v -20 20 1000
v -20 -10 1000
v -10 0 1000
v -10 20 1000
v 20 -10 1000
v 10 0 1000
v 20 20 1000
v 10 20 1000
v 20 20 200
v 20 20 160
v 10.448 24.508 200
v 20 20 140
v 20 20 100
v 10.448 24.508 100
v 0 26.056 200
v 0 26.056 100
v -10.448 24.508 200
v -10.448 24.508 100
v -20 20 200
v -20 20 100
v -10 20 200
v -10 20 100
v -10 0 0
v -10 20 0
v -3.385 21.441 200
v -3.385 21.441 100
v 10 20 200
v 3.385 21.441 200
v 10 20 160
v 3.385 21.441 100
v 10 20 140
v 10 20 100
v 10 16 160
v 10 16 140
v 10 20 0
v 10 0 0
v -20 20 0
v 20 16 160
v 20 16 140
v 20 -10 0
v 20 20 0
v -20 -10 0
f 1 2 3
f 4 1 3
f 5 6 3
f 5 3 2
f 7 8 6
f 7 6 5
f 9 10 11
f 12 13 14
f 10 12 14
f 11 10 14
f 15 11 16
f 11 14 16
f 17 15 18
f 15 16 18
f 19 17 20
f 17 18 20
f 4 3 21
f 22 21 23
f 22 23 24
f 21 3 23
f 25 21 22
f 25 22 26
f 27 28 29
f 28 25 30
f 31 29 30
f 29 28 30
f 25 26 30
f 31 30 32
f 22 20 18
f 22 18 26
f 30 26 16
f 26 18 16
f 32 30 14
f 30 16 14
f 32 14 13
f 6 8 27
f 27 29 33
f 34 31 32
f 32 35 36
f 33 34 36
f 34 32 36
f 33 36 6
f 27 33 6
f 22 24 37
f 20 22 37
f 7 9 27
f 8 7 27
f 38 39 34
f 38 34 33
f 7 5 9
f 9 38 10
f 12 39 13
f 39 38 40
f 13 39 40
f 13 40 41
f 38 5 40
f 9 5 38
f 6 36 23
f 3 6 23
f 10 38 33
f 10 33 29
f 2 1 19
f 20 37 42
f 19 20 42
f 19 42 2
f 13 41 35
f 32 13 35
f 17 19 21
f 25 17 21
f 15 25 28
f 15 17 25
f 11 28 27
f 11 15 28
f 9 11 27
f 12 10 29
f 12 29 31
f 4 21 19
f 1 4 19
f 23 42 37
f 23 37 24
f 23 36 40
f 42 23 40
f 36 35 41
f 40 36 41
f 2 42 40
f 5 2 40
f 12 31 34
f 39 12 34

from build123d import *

# Parameters (mm, degrees)
EXTRUDE_1_DEPTH          = 1000
EXTRUDE_2_DEPTH          = 100
CUT_EXTRUDE_3_DEPTH      = 20
CUT_EXTRUDE_3_DEPTH_BACK = 842.888353643


with BuildPart() as part:
    # Эскиз2 → Бобышка-Вытянуть1 (new body)
    with BuildSketch(Plane.XY):
        Polygon((0, 0), (-10, 0), (-10, 20), (-20, 20), (-20, -10), (0, -10), (20, -10), (20, 20), (10, 20), (10, 0), align=None)
    extrude(amount=EXTRUDE_1_DEPTH)

    # Эскиз5 → Бобышка-Вытянуть2 (add)
    with BuildSketch(Plane.XY.offset(100)):
        with BuildLine():
            Line((-20, 20), (-10, 20))
            ThreePointArc((-10, 20), (0, 21.622776602), (10, 20))
            Line((10, 20), (20, 20))
            ThreePointArc((20, 20), (0, 26.055512755), (-20, 20))
        make_face()
    extrude(amount=EXTRUDE_2_DEPTH)

    # Sketch 5 2 → Вырез-Вытянуть3 (cut, two sides: drawn at the far end of the back side and taken through both)
    with BuildSketch(Plane(origin=(30, 16, 160), x_dir=(0, 0.1961161351381843, -0.9805806756909201), z_dir=(-1, 0, 0)).offset(-CUT_EXTRUDE_3_DEPTH_BACK)):
        Polygon((0, 0), (0.784464541, -3.922322703), (20.396078054, 0), (19.611613514, 3.922322703), align=None)
    extrude(amount=CUT_EXTRUDE_3_DEPTH + CUT_EXTRUDE_3_DEPTH_BACK, mode=Mode.SUBTRACT)


solid = part.part
